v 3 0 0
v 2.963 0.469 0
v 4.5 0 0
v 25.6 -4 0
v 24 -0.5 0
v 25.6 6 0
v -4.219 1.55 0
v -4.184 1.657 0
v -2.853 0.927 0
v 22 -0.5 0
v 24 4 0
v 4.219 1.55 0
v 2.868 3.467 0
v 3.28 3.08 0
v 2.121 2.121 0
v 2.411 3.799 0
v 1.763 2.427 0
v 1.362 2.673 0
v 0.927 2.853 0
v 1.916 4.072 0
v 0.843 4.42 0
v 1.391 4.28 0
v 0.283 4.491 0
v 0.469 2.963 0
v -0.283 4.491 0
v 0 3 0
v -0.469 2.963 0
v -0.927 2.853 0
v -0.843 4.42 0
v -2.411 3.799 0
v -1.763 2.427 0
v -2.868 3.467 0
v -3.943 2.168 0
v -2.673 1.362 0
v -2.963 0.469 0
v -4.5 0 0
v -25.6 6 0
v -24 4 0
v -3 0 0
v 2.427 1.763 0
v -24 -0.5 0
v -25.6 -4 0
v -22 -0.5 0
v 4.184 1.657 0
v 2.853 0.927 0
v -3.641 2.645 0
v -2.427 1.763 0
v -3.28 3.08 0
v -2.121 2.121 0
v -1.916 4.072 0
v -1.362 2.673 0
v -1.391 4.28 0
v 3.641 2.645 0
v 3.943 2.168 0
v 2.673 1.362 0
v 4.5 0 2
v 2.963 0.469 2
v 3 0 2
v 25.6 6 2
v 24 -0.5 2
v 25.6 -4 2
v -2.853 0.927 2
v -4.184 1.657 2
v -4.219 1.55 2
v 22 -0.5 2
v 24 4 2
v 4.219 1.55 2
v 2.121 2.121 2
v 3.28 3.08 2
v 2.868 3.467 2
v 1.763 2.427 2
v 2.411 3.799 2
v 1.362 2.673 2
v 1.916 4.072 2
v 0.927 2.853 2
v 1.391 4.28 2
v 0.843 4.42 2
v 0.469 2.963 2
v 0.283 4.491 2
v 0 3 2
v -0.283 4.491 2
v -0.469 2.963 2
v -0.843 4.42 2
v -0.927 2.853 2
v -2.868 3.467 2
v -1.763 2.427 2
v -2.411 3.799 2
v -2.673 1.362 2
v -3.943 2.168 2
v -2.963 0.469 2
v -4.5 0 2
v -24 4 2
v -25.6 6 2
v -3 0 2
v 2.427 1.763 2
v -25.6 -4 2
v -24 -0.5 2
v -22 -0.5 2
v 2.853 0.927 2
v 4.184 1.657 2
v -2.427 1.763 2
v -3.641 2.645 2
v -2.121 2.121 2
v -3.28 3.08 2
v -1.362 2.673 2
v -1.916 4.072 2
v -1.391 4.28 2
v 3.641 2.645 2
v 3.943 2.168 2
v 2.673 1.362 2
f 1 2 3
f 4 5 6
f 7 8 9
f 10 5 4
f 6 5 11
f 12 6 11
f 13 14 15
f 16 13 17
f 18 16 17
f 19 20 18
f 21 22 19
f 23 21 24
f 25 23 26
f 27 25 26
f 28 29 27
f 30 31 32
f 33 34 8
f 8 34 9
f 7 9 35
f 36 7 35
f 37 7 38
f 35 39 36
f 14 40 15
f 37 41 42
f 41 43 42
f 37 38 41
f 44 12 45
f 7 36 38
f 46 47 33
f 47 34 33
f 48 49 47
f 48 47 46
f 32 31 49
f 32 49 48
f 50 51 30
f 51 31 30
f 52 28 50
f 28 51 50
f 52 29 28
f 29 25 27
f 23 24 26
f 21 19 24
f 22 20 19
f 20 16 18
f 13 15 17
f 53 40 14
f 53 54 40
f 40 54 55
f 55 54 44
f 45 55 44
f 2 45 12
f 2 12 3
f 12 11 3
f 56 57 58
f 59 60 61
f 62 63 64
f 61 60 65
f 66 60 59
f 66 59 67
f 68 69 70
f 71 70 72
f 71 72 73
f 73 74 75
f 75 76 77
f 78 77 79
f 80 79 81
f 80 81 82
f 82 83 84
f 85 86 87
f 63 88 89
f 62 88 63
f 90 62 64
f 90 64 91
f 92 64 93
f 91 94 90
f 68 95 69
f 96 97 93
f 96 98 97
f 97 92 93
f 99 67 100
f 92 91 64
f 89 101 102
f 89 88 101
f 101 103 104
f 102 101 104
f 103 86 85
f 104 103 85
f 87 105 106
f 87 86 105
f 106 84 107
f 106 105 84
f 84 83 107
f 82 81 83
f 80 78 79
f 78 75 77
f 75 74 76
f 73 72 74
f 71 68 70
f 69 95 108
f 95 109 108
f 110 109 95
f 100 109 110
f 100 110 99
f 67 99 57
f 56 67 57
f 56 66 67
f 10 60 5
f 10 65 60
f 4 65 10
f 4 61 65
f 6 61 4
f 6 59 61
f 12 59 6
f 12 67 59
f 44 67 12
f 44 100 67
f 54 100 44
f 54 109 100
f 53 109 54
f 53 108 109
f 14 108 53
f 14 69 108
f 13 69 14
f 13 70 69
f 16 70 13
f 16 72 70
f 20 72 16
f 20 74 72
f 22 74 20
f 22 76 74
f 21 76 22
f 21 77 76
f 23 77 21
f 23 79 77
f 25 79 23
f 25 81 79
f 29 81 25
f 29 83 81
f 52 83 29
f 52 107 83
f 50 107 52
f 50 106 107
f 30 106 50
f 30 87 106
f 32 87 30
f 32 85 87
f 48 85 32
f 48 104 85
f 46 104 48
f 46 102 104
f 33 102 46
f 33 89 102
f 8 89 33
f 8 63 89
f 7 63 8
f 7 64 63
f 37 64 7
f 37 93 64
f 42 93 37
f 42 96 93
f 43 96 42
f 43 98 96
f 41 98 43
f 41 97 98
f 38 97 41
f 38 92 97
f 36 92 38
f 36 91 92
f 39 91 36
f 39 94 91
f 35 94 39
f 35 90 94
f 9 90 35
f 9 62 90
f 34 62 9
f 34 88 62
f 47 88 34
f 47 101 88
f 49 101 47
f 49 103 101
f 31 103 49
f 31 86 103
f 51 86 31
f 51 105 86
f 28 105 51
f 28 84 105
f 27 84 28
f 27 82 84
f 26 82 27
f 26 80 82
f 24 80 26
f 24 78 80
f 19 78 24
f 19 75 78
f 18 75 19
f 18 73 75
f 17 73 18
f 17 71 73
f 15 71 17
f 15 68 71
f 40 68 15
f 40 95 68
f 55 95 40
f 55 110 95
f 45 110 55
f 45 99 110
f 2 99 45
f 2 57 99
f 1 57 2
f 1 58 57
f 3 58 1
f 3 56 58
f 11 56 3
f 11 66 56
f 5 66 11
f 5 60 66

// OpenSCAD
thick=4;
holed=6.8;
hook_type=4;
racks=2;
headoff=2;
xo=-15;
yo=20;
part="w";
if(part=="w") {
  linear_extrude(2) {
  difference(){
    circle(d=9,$fn=50);
    circle(d=6,$fn=40);
    translate([-10,-10]) square([20,10]);
  }
  for(m=[0,1]) mirror([m,0])
  polygon([[4.5,0],[24,4],[24,-.5],[22,-.5],[25.6,-4],[25.6,6],[3.5,1.4]]);
}
} else {
*for(i=[0:1])
  translate([2.5-xo*i,11+yo*i,10.4]) grab();
echo(str("build4(3)=",build4(racks)));
echo(str("buildpairs(",racks,")=",buildpairs(racks)));
boltpos=hook_type==4?build4(racks):
  [[9,7],[50,7],[50,36],[61,20],[20,20],[31,33]];
hook();
*!mount_block(1);
*!mount_plate();
*for(i=[0:1]) {
  *translate([0,i*40]) mount_block(3);
  *translate([14,14+i*40]) rotate([0,0,-90]) mount_block(2);
  for(j=[0:1])
  translate([65+j*40,10+i*40]) for(r=[0:4]) rotate([0,0,45+r*(360/5)]) translate([13,0]) mount_plate();
}
}
function buildpairs(pt=racks,force=0) = force || pt <= 0 ? concat([[pt,pt+1,holed],[0,racks,holed],[1,racks+1,holed]]) : concat(buildpairs(pt-2,0),buildpairs(pt,1));
function build4(pt=4,force=0) = force || pt <= 0 ? concat([[3-xo*pt,7+yo*pt],[44-xo*pt,7+yo*pt]]) : concat(build4(pt-1,0),build4(pt,1));
module hook(type=hook_type) {
  posn=hook_type==1?3:(
        hook_type==2?2:
        hook_type==3?-1:
        hook_type==4?5:1);
difference() {
  union() {
    linear_extrude(thick,convexity=3) minkowski(){
      union(){
        polygon([[0,-5],[8,-3],[8,5],[33.4,5],[33.4,-3],[34,-3],[34,5+headoff],[7.4,5+headoff],[7.4,-2.5],[0,-4.5]]);
        if(hook_type==3)
          translate([48,5]) rotate([0,0,10]) square([2,60]);
        else if(hook_type==4)
        {
          translate([0,holed/2-1.5+headoff,0])
            for(pairs=buildpairs())
          //for(pairs=[[0,4,holed],[0,1,holed],[1,5,holed],[2,3,holed],[4,5,holed]])
            hull(){
              translate(boltpos[pairs[0]]) circle(d=pairs[2],$fn=20);
              translate(boltpos[pairs[1]]) circle(d=pairs[2],$fn=20);
            }
        }
        translate([37,20]) difference() {
          intersection() {
            union(){
              if(hook_type<3)
              {
              circle(d=30,$fn=30);
              translate([11,-15]) square([20,10+(hook_type<3?20:0)]);
              }
            }
            if(hook_type<3)
            translate([0,-15]) square([15,33-(hook_type<3?0:5)]);
          }
          if(hook_type==1)
            circle(d=28,$fn=25);
          if(hook_type==2)
            translate([0,2,0]) scale([1,1.15]) circle(d=28,$fn=25);
        }
        *polygon([[50,5],[40,30],[40,5]]);
        *translate([49,5]) rotate([0,0,20]) square([1,30]);
      }
      circle(d=3,$fn=20);
    }
    if(posn>=0)
    translate([0,holed/2-1.5+headoff]) for(posi=[0:posn])
      translate(boltpos[posi]) cylinder(d=6,h=thick,$fn=30);
  }
  *translate([-2,-2,thick]) cube([40,6,24.5]);
  *translate([46,8,thick]) cube([6,34,24]);
  if(posn>=0)
  translate([0,holed/2-1.5+headoff,-.01]) for(posi=[0:posn])
      translate(boltpos[posi]) cylinder(d=holed,h=thick+.02,$fn=20);
}
}
module grab()
{
  rotate([0,90,0]) rotate([0,0,180]) translate([0,-27.5,-3.6]) import("ToolGrab_SingleHookedQI7.stl");

}
module mount_plate()
{
  difference() {
    union() {
      cylinder(d=13.8,h=4,$fn=40);
      cylinder(d1=13.8,d2=16,h=4,$fn=40);
      translate([0,0,4]) cylinder(d=16,h=1,$fn=40);
      cylinder(d=5.5,h=9,$fn=40);
    }
    translate([0,0,-.01]) {
      cylinder(d=4,h=9.02,$fn=40);
      cylinder(d1=8,d2=4,h=2,$fn=40);
    }
  }
}
module mount_block(points=2)
{
  spots=[[0,25.4],[0,0],[25.4,0]];
  linear_extrude(25.4/2) difference() {
    union(){
      if(points>1)
      for(i=[0:points-2])
        hull() {
          translate(spots[i]) circle(d=4,$fn=8);
          translate(spots[i+1]) circle(d=4,$fn=8);
        }
    for(spoti=[0:points-1])
      translate(spots[spoti]) circle(d=14,$fn=40);
  }
    for(spoti=[0:points-1])
      translate(spots[spoti]) circle(d=5,$fn=20);
  }
}
